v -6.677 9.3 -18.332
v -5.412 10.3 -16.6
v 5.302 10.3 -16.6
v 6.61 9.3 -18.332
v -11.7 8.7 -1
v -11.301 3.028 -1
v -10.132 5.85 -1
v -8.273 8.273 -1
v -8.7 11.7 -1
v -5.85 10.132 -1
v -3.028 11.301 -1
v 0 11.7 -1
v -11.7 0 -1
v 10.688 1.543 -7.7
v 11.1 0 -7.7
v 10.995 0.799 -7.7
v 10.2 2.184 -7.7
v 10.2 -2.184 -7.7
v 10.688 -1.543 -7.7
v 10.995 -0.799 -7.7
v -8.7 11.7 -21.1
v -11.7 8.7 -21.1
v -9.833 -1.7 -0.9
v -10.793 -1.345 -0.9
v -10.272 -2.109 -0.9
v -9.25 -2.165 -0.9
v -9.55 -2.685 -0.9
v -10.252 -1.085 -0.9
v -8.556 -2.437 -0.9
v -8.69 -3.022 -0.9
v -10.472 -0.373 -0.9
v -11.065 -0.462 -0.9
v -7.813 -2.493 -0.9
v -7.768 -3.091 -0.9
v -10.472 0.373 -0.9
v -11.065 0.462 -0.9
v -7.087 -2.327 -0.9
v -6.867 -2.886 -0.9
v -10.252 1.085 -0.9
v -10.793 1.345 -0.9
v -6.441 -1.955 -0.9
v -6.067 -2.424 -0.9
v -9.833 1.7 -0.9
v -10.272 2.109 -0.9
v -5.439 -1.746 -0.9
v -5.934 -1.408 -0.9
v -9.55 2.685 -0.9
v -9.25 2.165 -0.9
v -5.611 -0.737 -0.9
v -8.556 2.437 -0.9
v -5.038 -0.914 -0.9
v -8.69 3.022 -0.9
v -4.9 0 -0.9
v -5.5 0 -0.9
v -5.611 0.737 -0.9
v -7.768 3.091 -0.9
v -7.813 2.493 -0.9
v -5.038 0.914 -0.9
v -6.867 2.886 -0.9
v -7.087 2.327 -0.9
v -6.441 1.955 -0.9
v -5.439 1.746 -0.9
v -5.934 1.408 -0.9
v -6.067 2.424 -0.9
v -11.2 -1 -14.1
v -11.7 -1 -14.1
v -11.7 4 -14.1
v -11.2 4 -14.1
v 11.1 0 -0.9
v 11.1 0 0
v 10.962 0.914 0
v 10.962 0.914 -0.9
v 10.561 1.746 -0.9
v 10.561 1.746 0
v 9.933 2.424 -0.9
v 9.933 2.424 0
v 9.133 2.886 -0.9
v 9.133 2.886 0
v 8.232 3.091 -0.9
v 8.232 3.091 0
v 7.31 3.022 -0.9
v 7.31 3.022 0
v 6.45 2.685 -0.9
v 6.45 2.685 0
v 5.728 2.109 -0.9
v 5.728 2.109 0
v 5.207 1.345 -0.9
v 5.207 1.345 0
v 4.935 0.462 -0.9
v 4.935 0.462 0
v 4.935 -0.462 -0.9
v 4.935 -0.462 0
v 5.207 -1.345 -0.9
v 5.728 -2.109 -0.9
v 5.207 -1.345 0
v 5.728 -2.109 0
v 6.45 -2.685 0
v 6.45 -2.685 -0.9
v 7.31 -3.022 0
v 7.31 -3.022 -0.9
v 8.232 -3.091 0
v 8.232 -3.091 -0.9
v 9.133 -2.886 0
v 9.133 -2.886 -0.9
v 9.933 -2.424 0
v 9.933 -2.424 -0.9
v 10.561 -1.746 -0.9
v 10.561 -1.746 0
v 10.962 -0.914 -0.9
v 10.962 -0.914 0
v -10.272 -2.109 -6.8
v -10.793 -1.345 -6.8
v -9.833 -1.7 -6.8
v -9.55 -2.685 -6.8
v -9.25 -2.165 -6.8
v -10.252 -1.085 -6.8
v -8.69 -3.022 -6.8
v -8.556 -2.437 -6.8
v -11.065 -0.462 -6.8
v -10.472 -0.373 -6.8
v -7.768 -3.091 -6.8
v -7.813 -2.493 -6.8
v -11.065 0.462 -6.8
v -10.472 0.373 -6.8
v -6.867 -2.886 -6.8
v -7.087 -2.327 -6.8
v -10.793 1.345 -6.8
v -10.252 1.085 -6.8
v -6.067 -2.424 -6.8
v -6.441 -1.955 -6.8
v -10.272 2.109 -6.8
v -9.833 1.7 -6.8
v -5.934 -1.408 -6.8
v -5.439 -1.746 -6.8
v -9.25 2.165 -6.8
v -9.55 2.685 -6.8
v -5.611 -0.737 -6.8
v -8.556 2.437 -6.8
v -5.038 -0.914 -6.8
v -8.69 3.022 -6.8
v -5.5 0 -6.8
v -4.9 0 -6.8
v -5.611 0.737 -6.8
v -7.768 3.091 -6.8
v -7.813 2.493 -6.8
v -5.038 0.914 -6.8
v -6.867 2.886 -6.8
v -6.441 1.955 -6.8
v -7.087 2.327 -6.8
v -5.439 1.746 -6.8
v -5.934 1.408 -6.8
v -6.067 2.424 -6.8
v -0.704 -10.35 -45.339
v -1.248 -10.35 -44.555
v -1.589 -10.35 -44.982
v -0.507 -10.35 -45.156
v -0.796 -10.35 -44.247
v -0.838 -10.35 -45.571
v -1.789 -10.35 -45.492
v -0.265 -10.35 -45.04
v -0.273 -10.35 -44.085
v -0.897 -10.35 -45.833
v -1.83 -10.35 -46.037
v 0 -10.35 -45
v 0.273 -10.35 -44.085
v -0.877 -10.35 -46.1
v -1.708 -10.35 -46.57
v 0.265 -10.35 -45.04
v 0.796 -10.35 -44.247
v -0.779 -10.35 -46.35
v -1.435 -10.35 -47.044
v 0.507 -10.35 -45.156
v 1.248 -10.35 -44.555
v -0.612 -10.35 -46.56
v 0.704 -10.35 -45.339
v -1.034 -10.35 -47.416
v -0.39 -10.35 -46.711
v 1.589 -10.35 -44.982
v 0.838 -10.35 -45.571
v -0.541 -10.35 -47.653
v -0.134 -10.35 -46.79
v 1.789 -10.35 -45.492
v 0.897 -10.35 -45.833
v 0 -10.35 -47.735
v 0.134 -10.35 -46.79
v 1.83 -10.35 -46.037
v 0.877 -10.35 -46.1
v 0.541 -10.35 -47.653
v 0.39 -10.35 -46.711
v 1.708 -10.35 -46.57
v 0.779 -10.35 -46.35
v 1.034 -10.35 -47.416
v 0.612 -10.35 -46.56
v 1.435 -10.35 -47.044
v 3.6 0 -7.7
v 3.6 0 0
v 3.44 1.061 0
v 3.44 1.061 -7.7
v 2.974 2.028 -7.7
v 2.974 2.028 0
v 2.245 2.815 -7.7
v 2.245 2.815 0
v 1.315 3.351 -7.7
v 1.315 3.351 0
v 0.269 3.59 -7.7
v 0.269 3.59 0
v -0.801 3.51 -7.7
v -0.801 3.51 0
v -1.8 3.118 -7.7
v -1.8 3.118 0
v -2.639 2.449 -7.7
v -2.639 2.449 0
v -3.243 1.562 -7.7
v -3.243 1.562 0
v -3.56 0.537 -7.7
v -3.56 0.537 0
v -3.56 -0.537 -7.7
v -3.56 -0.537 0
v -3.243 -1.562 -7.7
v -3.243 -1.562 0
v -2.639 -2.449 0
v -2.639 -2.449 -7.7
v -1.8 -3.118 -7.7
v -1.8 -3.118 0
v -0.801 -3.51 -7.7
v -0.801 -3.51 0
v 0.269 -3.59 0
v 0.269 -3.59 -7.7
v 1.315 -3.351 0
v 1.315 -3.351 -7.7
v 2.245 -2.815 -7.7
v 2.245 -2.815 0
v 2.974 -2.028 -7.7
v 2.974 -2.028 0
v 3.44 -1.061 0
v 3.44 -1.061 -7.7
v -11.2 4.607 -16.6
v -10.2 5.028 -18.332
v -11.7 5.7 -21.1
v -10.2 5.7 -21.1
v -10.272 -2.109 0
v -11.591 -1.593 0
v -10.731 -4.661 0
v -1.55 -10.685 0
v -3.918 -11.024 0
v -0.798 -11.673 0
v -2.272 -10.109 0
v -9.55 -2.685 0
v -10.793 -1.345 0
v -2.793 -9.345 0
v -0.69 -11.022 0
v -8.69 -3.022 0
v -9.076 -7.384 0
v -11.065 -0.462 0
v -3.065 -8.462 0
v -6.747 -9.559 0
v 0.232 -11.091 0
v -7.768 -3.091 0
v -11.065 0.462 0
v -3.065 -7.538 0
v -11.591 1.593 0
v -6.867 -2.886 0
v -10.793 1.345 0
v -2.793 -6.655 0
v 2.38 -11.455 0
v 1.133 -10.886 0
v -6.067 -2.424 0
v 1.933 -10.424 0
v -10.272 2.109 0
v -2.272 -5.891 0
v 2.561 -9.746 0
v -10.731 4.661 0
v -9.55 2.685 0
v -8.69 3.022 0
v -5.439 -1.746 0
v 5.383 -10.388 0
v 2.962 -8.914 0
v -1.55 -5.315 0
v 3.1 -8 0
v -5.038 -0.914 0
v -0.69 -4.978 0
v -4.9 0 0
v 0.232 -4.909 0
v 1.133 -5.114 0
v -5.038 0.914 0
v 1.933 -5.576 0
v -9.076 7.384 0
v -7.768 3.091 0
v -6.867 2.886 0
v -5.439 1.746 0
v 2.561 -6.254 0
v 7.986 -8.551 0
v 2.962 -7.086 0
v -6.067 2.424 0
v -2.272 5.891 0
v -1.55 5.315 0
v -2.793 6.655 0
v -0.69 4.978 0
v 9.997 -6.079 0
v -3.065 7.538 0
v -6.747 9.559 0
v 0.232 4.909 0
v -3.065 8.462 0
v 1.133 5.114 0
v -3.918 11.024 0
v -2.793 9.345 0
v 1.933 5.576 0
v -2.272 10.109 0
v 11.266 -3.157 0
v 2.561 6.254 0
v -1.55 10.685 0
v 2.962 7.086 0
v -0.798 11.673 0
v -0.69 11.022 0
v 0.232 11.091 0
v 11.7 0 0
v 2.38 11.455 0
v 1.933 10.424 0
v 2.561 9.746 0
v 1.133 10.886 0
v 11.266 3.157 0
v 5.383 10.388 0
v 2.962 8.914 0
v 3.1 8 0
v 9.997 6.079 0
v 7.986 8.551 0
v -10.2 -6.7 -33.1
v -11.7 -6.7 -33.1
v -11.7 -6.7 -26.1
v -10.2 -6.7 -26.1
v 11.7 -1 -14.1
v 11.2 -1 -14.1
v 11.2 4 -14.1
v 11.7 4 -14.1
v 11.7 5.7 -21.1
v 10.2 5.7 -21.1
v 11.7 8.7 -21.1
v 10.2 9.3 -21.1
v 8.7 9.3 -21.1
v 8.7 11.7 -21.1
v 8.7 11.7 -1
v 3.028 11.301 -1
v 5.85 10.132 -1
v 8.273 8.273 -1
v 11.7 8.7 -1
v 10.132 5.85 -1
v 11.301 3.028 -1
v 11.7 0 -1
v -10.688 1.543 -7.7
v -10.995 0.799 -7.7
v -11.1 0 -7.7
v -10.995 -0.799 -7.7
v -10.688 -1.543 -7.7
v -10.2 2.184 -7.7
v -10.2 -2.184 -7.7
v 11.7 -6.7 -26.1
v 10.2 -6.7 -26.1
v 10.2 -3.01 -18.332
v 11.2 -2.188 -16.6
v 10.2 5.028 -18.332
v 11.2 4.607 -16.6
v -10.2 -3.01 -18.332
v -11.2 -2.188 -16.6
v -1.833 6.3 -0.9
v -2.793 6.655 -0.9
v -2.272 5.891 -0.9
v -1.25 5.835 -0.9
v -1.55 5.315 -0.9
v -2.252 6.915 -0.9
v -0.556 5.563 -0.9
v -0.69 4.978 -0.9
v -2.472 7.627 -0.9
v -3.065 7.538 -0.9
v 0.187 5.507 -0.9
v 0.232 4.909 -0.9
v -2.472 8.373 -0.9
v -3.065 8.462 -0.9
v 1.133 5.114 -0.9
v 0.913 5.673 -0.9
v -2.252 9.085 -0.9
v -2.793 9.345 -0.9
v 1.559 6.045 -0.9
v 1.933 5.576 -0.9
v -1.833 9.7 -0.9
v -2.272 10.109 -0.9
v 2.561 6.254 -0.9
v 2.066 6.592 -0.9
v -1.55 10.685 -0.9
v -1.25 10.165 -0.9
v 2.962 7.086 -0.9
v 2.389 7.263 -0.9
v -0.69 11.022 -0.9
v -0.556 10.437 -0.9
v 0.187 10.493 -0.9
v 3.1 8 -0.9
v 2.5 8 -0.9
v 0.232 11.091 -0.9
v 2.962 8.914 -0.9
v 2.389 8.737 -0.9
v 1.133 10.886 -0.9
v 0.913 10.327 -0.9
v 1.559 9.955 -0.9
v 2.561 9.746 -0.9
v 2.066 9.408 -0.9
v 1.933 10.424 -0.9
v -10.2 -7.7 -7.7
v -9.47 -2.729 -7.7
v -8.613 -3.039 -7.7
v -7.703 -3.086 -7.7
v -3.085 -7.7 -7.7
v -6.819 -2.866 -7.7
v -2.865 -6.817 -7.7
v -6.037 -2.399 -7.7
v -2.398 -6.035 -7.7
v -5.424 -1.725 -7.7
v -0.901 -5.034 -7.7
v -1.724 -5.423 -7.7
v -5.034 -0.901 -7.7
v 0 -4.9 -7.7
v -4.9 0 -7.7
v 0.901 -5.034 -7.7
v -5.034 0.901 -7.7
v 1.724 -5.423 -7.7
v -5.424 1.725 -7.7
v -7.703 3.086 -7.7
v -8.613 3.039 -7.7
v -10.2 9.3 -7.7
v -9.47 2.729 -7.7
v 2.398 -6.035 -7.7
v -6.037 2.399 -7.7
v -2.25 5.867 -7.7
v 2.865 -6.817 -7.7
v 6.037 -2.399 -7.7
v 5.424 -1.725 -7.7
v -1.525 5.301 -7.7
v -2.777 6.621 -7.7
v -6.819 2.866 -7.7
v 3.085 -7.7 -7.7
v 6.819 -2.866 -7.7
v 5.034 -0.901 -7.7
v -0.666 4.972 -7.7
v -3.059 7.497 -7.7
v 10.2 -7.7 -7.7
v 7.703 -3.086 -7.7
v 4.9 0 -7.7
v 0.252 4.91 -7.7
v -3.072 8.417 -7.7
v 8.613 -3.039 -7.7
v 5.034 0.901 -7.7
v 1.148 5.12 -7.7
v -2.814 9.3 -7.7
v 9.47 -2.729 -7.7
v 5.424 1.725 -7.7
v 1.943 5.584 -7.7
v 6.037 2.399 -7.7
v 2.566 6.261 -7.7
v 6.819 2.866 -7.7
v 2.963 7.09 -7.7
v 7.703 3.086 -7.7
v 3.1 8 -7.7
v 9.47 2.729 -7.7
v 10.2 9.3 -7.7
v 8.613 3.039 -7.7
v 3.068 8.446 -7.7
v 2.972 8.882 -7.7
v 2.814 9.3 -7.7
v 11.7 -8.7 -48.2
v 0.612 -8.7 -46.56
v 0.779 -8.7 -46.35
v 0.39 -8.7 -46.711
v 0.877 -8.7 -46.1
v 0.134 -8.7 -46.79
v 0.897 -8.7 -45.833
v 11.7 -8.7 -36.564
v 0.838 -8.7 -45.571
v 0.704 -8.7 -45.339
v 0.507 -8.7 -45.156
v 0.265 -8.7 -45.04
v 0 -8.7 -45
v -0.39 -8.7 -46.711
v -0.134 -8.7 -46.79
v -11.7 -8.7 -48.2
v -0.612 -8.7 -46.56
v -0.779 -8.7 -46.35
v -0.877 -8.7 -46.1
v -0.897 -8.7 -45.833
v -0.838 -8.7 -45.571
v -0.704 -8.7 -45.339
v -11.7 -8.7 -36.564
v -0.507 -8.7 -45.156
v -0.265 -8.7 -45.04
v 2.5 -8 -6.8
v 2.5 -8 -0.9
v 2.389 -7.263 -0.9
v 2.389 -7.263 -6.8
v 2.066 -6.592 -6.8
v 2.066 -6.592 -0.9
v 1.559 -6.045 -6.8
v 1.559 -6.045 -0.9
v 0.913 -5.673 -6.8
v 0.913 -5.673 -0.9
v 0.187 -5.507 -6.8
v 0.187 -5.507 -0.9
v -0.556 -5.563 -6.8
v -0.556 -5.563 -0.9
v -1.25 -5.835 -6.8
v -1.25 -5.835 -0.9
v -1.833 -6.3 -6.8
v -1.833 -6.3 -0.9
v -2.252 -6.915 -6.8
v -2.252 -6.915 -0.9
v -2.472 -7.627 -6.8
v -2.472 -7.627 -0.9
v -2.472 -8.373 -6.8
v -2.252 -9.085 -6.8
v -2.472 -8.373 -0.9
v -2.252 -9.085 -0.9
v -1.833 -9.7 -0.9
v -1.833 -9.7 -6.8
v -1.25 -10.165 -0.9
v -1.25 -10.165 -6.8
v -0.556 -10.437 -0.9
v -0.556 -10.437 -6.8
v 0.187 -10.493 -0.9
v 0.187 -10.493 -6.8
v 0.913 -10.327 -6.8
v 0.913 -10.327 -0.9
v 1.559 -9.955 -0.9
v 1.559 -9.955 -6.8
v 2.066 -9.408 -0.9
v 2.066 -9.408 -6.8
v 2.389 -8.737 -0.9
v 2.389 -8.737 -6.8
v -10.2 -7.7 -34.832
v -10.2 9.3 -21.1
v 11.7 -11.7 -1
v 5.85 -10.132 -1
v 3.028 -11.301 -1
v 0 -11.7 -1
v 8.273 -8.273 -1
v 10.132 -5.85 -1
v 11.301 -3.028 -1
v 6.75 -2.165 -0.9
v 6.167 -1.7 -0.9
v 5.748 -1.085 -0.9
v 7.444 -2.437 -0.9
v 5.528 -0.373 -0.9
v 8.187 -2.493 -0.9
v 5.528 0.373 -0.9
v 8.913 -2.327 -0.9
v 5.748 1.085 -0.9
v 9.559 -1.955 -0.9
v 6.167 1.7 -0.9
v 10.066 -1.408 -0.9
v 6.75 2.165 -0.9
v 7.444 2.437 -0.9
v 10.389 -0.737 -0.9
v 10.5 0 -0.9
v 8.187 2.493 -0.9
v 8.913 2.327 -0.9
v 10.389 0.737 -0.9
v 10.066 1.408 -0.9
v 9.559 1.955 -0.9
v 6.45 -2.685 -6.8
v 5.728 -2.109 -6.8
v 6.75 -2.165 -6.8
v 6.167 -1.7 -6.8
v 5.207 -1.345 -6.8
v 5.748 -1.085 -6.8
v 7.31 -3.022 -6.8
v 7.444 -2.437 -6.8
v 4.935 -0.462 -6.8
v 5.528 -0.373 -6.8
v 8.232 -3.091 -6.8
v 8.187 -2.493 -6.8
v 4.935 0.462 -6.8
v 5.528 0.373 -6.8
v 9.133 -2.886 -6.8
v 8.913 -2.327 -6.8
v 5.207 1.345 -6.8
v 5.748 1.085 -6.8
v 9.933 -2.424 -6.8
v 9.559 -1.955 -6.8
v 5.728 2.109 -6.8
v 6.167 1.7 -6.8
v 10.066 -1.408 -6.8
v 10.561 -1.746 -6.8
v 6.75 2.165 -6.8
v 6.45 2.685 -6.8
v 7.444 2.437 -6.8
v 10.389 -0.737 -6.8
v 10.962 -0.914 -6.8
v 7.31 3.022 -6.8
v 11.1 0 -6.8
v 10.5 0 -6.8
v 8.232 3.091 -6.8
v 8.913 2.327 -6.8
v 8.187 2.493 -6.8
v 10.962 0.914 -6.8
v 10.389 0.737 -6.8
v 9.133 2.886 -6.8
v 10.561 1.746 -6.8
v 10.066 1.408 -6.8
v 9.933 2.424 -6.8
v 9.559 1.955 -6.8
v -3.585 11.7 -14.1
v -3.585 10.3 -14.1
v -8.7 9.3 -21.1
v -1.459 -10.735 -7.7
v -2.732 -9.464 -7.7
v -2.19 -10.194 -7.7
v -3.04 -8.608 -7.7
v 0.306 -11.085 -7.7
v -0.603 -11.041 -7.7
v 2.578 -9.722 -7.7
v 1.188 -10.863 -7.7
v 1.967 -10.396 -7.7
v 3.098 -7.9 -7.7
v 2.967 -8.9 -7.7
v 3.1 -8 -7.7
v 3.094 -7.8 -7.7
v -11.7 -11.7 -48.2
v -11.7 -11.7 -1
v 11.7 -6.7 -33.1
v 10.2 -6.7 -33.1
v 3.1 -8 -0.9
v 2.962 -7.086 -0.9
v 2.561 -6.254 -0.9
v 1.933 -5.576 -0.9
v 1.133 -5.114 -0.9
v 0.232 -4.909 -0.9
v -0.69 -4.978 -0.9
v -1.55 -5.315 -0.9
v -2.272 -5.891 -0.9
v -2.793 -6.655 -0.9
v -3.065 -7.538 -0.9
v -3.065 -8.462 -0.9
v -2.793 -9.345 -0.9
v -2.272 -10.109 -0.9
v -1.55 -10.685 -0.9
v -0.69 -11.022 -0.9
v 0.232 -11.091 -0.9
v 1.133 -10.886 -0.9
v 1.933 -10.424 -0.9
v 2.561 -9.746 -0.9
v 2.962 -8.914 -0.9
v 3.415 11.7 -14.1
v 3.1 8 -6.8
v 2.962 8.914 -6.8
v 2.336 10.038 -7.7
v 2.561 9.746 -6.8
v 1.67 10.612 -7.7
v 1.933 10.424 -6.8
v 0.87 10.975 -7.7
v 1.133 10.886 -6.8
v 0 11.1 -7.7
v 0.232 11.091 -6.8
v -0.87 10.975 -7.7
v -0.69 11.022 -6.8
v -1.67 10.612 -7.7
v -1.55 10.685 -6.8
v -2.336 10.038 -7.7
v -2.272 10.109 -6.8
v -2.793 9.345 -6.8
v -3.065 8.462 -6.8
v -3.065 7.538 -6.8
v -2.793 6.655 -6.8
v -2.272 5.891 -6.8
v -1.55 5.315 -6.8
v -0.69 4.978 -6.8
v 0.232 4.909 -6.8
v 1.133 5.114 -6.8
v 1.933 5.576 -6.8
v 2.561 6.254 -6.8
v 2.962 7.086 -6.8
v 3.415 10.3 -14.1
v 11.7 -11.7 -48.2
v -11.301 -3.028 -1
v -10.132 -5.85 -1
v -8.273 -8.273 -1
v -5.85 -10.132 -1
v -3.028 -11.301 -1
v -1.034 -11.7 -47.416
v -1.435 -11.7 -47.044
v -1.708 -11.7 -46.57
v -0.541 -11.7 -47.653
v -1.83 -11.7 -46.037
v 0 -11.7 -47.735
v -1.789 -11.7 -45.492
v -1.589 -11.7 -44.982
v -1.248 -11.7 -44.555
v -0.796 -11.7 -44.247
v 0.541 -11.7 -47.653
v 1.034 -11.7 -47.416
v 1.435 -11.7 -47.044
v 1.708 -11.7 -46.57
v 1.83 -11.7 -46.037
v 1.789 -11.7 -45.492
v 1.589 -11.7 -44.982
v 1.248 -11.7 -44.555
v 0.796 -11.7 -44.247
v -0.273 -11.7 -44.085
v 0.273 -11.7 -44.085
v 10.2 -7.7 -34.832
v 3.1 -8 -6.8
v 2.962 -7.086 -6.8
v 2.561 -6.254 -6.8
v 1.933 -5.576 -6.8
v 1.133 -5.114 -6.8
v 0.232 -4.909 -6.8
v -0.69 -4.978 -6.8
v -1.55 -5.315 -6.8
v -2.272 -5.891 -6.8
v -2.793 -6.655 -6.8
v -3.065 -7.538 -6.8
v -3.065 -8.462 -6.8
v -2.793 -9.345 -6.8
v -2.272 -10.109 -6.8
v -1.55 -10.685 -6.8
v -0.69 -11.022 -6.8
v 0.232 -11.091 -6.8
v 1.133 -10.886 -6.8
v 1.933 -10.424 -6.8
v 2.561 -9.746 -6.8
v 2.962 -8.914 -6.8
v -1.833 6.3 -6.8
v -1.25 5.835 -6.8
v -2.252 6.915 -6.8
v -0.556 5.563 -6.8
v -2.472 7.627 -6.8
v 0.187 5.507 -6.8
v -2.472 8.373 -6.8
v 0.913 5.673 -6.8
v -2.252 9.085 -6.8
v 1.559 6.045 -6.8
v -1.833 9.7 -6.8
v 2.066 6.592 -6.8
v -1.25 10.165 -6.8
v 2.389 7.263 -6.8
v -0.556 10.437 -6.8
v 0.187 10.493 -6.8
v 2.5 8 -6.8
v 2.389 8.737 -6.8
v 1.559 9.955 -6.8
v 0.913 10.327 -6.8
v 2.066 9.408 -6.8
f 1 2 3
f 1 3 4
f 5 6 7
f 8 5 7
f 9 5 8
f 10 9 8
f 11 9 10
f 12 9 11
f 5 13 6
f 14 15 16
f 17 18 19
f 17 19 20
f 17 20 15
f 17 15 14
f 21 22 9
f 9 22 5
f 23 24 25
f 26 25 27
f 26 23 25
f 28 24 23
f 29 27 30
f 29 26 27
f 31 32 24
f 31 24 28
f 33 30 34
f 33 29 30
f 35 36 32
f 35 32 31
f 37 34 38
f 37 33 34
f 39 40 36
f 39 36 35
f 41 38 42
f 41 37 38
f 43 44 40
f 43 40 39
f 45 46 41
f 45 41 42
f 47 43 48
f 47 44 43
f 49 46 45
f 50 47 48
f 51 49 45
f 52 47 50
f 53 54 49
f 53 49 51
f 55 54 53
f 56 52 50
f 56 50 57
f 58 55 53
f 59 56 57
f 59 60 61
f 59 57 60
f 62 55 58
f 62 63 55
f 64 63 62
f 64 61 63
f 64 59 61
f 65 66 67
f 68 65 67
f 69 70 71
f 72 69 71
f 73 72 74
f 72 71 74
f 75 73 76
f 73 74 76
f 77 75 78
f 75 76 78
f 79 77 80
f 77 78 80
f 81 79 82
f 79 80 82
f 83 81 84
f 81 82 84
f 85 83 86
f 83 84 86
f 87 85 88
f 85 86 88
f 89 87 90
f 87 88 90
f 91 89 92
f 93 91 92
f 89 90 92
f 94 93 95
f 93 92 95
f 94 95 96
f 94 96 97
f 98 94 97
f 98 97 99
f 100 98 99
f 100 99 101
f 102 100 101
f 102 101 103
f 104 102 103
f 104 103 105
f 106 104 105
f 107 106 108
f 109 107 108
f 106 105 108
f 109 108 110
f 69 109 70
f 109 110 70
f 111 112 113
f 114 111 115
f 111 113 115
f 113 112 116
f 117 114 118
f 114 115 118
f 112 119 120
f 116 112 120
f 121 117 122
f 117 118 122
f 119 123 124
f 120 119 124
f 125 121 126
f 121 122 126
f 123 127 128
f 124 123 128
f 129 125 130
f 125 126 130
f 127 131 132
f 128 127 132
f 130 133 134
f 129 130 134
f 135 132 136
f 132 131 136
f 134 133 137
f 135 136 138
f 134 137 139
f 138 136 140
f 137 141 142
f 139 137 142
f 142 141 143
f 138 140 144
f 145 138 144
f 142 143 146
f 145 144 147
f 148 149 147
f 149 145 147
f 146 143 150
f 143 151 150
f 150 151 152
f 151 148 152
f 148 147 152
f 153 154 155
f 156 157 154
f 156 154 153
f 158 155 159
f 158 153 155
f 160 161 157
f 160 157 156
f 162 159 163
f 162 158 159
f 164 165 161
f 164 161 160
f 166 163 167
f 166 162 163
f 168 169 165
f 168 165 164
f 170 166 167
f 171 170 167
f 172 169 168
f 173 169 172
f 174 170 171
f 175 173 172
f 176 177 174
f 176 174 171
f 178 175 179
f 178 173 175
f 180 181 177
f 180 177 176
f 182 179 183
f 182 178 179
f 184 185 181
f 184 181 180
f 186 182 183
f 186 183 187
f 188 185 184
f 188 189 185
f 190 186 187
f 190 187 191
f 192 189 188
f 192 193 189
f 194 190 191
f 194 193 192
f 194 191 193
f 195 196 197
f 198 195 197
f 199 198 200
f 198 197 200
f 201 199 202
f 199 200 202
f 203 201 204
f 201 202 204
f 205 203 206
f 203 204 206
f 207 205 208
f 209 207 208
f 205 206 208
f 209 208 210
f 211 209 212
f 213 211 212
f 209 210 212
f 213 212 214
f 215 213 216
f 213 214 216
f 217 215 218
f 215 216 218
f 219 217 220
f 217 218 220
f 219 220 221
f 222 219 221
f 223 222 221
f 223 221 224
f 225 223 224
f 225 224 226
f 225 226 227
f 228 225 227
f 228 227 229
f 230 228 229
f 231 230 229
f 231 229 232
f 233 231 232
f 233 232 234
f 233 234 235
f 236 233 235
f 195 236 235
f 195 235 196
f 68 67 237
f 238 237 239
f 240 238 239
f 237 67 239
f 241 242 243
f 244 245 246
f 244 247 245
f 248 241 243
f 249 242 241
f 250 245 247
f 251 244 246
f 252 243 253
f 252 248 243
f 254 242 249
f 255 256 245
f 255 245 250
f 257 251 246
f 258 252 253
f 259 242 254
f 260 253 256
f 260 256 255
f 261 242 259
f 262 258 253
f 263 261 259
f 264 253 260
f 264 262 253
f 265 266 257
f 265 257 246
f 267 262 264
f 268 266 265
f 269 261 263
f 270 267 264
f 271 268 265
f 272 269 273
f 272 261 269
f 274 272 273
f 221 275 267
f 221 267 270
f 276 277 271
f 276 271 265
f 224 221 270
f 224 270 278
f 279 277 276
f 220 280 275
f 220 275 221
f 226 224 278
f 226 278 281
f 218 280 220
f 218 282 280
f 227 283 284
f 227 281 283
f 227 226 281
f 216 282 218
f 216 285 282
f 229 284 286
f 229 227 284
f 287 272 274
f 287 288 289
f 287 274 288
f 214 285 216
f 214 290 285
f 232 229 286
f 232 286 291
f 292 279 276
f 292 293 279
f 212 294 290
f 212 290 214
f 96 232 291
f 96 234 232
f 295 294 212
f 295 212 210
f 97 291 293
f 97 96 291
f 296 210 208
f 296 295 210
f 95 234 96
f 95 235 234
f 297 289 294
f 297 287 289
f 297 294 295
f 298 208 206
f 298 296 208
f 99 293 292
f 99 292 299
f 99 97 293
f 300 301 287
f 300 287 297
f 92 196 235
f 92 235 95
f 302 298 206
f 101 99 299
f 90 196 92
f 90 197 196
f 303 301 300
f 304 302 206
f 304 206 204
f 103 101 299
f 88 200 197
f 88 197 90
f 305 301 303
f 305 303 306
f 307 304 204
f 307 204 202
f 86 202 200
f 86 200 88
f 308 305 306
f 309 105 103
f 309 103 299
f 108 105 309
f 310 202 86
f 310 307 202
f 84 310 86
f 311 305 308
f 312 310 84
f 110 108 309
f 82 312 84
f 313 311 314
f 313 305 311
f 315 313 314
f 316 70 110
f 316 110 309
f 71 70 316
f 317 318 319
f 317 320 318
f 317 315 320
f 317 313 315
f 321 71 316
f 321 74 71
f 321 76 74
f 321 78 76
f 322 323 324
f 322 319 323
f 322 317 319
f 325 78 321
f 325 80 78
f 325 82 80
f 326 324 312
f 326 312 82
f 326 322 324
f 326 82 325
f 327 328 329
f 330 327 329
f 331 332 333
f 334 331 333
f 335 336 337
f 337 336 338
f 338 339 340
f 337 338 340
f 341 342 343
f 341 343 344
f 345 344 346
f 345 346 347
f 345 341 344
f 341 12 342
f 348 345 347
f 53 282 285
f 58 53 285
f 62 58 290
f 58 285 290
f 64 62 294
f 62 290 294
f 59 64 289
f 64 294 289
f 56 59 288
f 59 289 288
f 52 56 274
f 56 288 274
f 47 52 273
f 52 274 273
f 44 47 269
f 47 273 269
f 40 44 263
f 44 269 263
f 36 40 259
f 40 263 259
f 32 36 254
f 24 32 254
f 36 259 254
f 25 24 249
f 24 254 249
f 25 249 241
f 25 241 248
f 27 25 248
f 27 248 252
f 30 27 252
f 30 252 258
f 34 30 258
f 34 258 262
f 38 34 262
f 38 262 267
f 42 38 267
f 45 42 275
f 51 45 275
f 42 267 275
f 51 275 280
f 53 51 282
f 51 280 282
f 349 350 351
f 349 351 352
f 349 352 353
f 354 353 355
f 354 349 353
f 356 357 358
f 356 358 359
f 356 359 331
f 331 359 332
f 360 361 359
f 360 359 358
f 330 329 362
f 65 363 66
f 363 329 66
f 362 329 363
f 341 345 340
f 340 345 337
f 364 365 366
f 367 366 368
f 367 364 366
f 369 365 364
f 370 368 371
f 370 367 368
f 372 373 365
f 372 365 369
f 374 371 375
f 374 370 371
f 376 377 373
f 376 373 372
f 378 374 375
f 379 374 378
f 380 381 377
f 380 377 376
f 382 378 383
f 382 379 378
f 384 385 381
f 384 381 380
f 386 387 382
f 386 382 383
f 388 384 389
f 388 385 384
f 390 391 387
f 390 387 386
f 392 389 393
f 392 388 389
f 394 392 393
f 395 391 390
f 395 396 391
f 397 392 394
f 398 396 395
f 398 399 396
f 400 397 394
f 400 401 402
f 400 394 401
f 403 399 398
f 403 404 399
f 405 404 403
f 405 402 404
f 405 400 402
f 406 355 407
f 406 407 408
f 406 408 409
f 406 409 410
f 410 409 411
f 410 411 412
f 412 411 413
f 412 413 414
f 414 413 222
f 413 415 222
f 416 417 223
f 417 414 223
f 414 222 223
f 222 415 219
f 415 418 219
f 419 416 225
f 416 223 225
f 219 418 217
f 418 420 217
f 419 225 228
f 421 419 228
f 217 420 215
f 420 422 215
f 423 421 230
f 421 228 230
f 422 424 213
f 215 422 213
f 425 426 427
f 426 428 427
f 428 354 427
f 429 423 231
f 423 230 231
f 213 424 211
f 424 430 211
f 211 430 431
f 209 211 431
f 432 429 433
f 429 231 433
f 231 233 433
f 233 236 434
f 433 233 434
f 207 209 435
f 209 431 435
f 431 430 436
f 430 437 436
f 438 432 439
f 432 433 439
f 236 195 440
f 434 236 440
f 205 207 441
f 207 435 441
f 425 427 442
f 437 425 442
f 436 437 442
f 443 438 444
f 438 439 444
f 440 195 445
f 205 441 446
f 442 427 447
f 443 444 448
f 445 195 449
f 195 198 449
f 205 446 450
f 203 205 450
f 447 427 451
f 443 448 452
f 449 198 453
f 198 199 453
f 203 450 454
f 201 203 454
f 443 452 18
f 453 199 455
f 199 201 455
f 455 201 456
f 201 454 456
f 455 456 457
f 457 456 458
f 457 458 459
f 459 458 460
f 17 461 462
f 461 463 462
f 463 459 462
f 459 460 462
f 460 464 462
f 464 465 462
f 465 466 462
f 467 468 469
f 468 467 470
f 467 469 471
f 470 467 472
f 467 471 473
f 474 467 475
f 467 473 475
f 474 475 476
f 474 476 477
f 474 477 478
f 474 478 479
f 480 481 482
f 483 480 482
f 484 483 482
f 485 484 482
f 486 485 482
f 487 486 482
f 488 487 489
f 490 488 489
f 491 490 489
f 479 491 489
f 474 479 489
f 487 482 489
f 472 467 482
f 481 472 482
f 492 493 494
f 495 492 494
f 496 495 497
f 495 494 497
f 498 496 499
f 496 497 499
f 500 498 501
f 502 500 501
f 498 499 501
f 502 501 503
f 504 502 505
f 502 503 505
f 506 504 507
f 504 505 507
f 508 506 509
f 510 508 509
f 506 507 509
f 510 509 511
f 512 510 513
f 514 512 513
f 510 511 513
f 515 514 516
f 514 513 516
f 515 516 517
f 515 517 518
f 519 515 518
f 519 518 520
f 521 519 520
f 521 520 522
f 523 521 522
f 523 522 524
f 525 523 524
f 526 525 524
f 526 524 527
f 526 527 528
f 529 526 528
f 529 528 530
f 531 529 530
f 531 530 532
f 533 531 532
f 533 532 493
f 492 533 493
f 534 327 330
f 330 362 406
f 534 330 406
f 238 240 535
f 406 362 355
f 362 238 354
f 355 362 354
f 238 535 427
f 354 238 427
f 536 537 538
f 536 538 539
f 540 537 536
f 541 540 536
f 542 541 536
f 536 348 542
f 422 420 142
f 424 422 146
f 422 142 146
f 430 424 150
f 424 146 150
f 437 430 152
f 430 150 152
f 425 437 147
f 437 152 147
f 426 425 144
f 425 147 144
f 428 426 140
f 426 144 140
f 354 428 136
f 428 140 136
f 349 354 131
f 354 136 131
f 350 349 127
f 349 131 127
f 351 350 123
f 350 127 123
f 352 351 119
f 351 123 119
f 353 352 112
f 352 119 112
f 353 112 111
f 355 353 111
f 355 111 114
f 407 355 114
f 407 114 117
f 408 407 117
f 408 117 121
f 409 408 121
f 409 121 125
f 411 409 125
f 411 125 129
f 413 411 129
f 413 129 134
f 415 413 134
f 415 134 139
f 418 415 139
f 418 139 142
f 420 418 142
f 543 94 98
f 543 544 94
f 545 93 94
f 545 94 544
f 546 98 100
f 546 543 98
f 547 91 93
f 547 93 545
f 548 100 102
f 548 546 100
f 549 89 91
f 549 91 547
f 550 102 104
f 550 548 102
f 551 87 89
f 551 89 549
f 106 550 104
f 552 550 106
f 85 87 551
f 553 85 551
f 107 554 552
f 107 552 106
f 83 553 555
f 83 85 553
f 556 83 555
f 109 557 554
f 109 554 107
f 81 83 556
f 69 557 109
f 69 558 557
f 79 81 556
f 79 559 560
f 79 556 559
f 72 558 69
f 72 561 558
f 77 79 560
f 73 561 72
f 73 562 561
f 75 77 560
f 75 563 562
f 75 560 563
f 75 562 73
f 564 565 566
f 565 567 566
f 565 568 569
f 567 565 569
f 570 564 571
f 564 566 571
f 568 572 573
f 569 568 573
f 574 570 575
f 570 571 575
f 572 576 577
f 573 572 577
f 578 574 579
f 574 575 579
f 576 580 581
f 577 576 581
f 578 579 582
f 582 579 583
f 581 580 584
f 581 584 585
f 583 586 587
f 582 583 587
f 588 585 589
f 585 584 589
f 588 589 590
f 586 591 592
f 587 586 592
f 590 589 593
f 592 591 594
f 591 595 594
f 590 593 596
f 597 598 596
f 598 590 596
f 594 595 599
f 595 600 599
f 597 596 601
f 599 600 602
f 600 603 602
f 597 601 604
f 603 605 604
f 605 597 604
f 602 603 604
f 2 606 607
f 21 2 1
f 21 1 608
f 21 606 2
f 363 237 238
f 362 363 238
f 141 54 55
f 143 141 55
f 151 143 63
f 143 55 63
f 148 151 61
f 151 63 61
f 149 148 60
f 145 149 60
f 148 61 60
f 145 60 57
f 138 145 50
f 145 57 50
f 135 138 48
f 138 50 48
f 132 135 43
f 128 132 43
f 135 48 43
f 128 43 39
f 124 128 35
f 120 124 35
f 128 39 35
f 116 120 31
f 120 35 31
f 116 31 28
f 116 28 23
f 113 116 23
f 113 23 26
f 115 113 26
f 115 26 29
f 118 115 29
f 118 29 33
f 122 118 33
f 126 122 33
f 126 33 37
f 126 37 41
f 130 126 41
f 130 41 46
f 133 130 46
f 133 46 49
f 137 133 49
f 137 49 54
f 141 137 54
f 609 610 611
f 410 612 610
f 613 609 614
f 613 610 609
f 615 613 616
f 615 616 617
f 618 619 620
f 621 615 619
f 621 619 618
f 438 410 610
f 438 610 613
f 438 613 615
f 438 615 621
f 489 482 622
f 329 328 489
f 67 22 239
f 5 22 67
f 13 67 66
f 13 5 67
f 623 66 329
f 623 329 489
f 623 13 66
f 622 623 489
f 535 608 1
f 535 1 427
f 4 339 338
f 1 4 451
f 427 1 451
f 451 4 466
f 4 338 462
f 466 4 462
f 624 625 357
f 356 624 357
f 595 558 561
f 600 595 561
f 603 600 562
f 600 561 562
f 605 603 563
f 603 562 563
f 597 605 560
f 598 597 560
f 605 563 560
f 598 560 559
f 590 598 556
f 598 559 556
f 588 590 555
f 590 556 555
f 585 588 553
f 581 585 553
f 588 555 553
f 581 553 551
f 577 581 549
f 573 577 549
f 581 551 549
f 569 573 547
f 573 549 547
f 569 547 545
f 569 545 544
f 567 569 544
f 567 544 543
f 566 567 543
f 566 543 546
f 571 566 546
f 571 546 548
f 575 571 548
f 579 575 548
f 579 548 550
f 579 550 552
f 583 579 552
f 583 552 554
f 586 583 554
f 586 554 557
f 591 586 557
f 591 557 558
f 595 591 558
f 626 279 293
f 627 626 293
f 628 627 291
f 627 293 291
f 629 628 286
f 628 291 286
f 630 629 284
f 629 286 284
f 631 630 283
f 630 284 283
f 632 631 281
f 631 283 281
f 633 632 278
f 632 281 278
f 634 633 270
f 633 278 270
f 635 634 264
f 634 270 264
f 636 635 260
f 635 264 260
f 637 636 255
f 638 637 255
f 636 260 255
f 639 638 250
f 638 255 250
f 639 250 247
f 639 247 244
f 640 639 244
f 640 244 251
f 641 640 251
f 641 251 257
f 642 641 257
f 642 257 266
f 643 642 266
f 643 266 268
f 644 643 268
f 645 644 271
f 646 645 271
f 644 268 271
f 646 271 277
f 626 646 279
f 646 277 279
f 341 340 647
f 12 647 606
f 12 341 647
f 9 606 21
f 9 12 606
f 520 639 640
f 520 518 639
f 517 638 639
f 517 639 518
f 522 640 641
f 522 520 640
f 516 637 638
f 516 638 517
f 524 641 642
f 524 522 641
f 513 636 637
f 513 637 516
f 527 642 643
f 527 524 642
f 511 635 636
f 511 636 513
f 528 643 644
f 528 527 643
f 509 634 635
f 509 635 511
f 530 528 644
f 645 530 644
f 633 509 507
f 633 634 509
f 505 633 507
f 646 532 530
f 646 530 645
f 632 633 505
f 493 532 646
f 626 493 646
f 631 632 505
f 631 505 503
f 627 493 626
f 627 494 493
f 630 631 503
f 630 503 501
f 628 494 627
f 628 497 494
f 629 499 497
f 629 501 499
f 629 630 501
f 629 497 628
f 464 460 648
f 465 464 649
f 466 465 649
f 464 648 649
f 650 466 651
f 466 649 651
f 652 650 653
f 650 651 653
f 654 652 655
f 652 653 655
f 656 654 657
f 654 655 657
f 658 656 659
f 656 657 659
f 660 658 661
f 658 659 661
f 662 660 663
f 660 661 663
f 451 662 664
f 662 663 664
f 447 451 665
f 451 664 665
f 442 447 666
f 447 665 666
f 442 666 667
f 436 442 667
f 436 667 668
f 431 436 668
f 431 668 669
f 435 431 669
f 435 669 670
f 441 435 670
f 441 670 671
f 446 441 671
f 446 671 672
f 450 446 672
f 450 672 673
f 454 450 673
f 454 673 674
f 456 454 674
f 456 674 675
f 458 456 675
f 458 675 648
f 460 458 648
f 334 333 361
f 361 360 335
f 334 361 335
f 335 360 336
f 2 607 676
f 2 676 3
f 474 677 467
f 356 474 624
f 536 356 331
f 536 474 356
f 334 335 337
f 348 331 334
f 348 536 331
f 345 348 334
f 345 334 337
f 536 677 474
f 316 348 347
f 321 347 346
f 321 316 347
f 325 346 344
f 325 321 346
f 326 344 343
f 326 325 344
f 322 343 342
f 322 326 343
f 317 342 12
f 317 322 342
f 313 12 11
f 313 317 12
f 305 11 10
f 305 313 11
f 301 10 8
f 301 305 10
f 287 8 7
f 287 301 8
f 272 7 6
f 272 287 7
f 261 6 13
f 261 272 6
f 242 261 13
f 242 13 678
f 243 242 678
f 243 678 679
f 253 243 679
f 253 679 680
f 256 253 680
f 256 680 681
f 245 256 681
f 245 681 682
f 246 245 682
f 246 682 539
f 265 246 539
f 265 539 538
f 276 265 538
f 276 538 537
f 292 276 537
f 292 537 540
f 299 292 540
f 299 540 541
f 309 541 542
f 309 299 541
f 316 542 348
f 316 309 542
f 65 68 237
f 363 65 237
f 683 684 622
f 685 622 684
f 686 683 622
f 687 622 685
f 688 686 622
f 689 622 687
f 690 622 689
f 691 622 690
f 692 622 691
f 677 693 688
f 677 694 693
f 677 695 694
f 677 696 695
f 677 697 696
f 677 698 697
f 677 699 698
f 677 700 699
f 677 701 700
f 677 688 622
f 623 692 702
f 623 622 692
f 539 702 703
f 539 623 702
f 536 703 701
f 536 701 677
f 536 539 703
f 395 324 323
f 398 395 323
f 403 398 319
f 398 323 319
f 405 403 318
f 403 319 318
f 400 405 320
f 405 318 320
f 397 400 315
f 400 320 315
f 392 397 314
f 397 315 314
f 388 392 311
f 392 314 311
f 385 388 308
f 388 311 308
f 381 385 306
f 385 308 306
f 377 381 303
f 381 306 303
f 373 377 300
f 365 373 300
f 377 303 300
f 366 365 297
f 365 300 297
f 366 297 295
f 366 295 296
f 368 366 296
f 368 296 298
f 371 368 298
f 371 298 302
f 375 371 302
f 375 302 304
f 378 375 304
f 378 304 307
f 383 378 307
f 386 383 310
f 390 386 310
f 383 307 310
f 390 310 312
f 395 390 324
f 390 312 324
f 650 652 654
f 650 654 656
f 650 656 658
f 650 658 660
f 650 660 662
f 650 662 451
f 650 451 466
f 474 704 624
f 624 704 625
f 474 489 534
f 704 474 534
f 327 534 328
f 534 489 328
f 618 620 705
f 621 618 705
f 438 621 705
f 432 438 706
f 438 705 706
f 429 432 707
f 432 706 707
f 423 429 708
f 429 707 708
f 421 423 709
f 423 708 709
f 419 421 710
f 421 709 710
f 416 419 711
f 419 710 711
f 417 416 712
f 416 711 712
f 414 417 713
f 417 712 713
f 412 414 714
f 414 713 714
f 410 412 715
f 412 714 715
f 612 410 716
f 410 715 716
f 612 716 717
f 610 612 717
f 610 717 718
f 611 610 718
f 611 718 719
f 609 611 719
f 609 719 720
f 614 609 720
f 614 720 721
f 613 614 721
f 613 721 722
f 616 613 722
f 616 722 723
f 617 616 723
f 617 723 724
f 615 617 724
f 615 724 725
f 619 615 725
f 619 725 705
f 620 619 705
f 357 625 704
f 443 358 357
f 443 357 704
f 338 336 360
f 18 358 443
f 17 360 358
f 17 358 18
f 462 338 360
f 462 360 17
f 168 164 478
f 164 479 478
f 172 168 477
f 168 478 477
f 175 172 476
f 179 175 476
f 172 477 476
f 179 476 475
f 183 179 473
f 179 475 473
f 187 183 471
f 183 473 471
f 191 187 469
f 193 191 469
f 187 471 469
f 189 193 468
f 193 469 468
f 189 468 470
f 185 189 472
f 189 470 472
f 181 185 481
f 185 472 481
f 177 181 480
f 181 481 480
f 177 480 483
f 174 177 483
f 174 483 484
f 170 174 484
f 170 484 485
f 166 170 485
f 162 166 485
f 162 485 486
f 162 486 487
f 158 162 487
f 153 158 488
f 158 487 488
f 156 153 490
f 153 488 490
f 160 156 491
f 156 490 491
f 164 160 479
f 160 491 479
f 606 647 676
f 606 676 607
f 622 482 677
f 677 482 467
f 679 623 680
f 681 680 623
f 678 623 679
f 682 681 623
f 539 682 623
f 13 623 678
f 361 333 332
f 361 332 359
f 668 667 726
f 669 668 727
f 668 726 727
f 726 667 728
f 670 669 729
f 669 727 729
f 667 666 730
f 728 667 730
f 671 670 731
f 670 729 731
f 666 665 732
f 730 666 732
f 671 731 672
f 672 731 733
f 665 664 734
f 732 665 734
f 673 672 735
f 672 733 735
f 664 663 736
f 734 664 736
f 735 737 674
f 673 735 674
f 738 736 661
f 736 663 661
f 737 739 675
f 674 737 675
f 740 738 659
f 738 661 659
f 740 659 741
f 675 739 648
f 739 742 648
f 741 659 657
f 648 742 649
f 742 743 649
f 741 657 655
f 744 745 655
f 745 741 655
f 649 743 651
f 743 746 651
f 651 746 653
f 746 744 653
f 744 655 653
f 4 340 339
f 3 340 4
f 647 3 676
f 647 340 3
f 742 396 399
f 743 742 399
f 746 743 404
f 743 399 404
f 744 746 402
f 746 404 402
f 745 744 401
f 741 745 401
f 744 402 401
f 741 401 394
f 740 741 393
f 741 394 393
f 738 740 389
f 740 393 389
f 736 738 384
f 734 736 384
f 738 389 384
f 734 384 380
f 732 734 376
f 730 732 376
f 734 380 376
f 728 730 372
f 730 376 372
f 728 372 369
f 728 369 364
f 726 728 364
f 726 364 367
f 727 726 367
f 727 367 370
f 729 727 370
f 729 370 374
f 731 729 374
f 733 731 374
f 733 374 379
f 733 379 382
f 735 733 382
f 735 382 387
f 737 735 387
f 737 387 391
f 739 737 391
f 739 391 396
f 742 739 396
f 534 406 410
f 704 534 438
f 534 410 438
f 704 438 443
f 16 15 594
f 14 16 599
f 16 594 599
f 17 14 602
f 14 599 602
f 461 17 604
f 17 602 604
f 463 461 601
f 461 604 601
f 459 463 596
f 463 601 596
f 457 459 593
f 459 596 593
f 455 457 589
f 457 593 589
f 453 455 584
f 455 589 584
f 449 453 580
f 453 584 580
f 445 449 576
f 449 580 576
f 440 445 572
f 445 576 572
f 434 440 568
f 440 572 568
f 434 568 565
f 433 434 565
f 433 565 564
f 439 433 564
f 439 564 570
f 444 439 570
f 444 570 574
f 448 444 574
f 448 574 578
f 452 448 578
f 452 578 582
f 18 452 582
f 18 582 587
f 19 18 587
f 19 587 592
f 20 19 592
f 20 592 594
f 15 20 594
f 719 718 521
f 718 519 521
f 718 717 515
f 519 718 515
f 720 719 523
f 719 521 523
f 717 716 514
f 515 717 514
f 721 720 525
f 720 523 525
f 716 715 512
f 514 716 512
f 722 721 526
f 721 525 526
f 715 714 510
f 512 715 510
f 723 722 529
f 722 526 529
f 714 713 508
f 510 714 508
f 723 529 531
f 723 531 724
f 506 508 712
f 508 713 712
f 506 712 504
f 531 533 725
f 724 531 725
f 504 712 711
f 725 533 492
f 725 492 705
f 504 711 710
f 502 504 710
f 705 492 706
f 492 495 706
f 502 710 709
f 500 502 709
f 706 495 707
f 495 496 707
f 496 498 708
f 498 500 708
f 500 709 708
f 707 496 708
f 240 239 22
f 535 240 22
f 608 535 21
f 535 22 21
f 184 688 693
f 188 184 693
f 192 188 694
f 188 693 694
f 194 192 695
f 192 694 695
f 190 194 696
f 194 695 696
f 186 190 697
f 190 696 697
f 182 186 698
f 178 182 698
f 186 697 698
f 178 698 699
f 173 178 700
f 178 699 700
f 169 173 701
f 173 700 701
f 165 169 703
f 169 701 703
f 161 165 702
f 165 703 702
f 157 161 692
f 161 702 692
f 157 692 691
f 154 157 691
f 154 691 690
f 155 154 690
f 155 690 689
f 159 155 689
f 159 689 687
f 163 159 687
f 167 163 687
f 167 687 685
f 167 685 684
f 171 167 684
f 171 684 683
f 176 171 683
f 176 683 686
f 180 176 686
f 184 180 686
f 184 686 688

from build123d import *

# Parameters (mm, degrees)
SKETCH_1_R                  = 11.7
EXTRUDE_1_DEPTH             = 7.7
SKETCH_1_3_R                = 2.5
CUT_EXTRUDE_1_DEPTH         = 19.250205478
SKETCH_1_5_R                = 3.1
SKETCH_1_5_R_2              = 2.5
CUT_EXTRUDE_2_DEPTH         = 0.9
CUT_EXTRUDE_START           = -6.8
SKETCH_1_6_R                = 3.1
SKETCH_1_6_R_2              = 2.5
CUT_EXTRUDE_3_DEPTH         = 0.9
EXTRUDE_START               = -7.7
SKETCH_2_W                  = 23.4
SKETCH_2_H                  = 2.4
SKETCH_2_H_2                = 4
EXTRUDE_3_DEPTH             = 40.5
SKETCH_3_W                  = 1.5
SKETCH_3_H                  = 23.4
EXTRUDE_4_DEPTH             = 40.3
EXTRUDE_START_2             = -1
EXTRUDE_5_DEPTH             = 6.7
CUT_EXTRUDE_5_DEPTH         = 55.842410596
CHAMFER_1_SIZE              = 3
CUT_EXTRUDE_6_REACH         = 56.842
EXTRUDE_6_REACH             = 52.961
EXTRUDE_6_DIRECTION_2_REACH = 52.961
EXTRUDE_7_REACH             = 52.961
EXTRUDE_7_DIRECTION_2_REACH = 52.961
HOLE_WIZARD_1_D             = 1.8
HOLE_WIZARD_1_CBORE_D       = 3.67
HOLE_WIZARD_1_CBORE_DEPTH   = 1.35
CUT_EXTRUDE_7_REACH         = 52.961
SKETCH_19_R                 = 3.6


with BuildPart() as part:
    # 草图1 → 凸台-拉伸1 (new body)
    with BuildSketch(Plane.XY):
        Circle(SKETCH_1_R)
    extrude(amount=-EXTRUDE_1_DEPTH)

    # 草图1<3> → 切除-拉伸1 (cut, through all)
    with BuildSketch(Plane.XY):
        with Locations((-8, 0)):
            Circle(SKETCH_1_3_R)
        with Locations((0, 8)):
            Circle(SKETCH_1_3_R)
        with Locations((8, 0)):
            Circle(SKETCH_1_3_R)
        with Locations((0, -8)):
            Circle(SKETCH_1_3_R)
    extrude(amount=-CUT_EXTRUDE_1_DEPTH, mode=Mode.SUBTRACT)

    # 草图1<5> → 切除-拉伸2 (cut)
    # profile 1 of 4: a face of its own
    with BuildSketch(Plane.XY):
        with Locations((-8, 0)):
            Circle(SKETCH_1_5_R)
        with Locations((-8, 0)):
            Circle(SKETCH_1_5_R_2, mode=Mode.SUBTRACT)
    # profile 2 of 4: a face of its own
    with BuildSketch(Plane.XY):
        with Locations((0, 8)):
            Circle(SKETCH_1_5_R)
        with Locations((0, 8)):
            Circle(SKETCH_1_5_R_2, mode=Mode.SUBTRACT)
    # profile 3 of 4: a face of its own
    with BuildSketch(Plane.XY):
        with Locations((8, 0)):
            Circle(SKETCH_1_5_R)
        with Locations((8, 0)):
            Circle(SKETCH_1_5_R_2, mode=Mode.SUBTRACT)
    # profile 4 of 4: a face of its own
    with BuildSketch(Plane.XY):
        with Locations((0, -8)):
            Circle(SKETCH_1_5_R)
        with Locations((0, -8)):
            Circle(SKETCH_1_5_R_2, mode=Mode.SUBTRACT)
    extrude(amount=-CUT_EXTRUDE_2_DEPTH, mode=Mode.SUBTRACT)

    # 草图1<6> → 切除-拉伸3 (cut)
    # profile 1 of 4: a face of its own
    with BuildSketch(Plane.XY.offset(CUT_EXTRUDE_START)):
        with Locations((-8, 0)):
            Circle(SKETCH_1_6_R)
        with Locations((-8, 0)):
            Circle(SKETCH_1_6_R_2, mode=Mode.SUBTRACT)
    # profile 2 of 4: a face of its own
    with BuildSketch(Plane.XY.offset(CUT_EXTRUDE_START)):
        with Locations((8, 0)):
            Circle(SKETCH_1_6_R)
        with Locations((8, 0)):
            Circle(SKETCH_1_6_R_2, mode=Mode.SUBTRACT)
    # profile 3 of 4: a face of its own
    with BuildSketch(Plane.XY.offset(CUT_EXTRUDE_START)):
        with Locations((0, -8)):
            Circle(SKETCH_1_6_R)
        with Locations((0, -8)):
            Circle(SKETCH_1_6_R_2, mode=Mode.SUBTRACT)
    # profile 4 of 4: a face of its own
    with BuildSketch(Plane.XY.offset(CUT_EXTRUDE_START)):
        with Locations((0, 8)):
            Circle(SKETCH_1_6_R)
        with Locations((0, 8)):
            Circle(SKETCH_1_6_R_2, mode=Mode.SUBTRACT)
    extrude(amount=-CUT_EXTRUDE_3_DEPTH, mode=Mode.SUBTRACT)

    # 草图2 → 凸台-拉伸3 (add)
    with BuildSketch(Plane.XY.offset(EXTRUDE_START)):
        with Locations((0, 10.5)):
            Rectangle(SKETCH_2_W, SKETCH_2_H)
        with Locations((0, -9.7)):
            Rectangle(SKETCH_2_W, SKETCH_2_H_2)
    extrude(amount=-EXTRUDE_3_DEPTH)

    # 草图3 → 凸台-拉伸4 (add)
    with BuildSketch(Plane.XY.offset(EXTRUDE_START)):
        with Locations((-10.95, 0)):
            Rectangle(SKETCH_3_W, SKETCH_3_H)
        with Locations((10.95, 0)):
            Rectangle(SKETCH_3_W, SKETCH_3_H)
    extrude(amount=-EXTRUDE_4_DEPTH)

    # 草图4 → 凸台-拉伸5 (add)
    with BuildSketch(Plane.XY.offset(EXTRUDE_START_2)):
        with BuildLine():
            Line((3.2e-08, 11.7), (-11.7, 11.7))
            Line((-11.7, 11.7), (-11.7, 0))
            ThreePointArc((-11.7, 0), (-8.273149328, 8.273149351), (3.2e-08, 11.7))
        make_face()
        with BuildLine():
            Line((11.7, 11.7), (3.2e-08, 11.7))
            ThreePointArc((3.2e-08, 11.7), (8.273149351, 8.273149328), (11.7, 0))
            Line((11.7, 0), (11.7, 11.7))
        make_face()
        with BuildLine():
            ThreePointArc((3e-09, -11.7), (-8.273149339, -8.273149341), (-11.7, 0))
            Line((-11.7, 0), (-11.7, -11.7))
            Line((-11.7, -11.7), (3e-09, -11.7))
        make_face()
        with BuildLine():
            Line((11.7, -11.7), (11.7, 0))
            ThreePointArc((11.7, 0), (8.273149341, -8.273149339), (3e-09, -11.7))
            Line((3e-09, -11.7), (11.7, -11.7))
        make_face()
    extrude(amount=-EXTRUDE_5_DEPTH)

    # 草图7 → 切除-拉伸5 (cut, through all)
    with BuildSketch(Plane.ZY.offset(11.7)):
        Polygon((-48.2, 11.7), (-48.2, -8.7), (-36.564101615, -8.7), (-33.1, -6.7), (-26.1, -6.7), (-14.1, -1), (-14.1, 4), (-21.1, 5.7), (-21.1, 11.7), align=None)
    extrude(amount=-CUT_EXTRUDE_5_DEPTH, mode=Mode.SUBTRACT)

    # 倒角1
    chamfer_1_edges = [part.edges().sort_by_distance(p)[0] for p in [
        (-11.7, 11.7, -11.05),
        (11.7, 11.7, -11.05),
    ]]
    chamfer(chamfer_1_edges, length=CHAMFER_1_SIZE)

    # 草图8 → 切除-拉伸6 (cut, up to next)
    with BuildSketch(Plane(origin=(0, 11.7, 0), x_dir=(1, 0, 0), z_dir=(0, 1, 0)), mode=Mode.PRIVATE) as cut_extrude_6_sk1:
        Polygon((8.7, 21.1), (3.414837489, 14.1), (-3.585162511, 14.1), (-8.7, 21.1), align=None)
    cut_extrude_6_tool1 = extrude(cut_extrude_6_sk1.sketch, amount=-CUT_EXTRUDE_6_REACH, mode=Mode.PRIVATE) & part.part
    add(cut_extrude_6_tool1.solids().sort_by_distance((-0.036531, 11.7, -18.097268))[0], mode=Mode.SUBTRACT)

    # 草图12 → 凸台-拉伸6 (add, up to next)
    with BuildSketch(Plane(origin=(0, 0, 0), x_dir=(0, 0, -1), z_dir=(1, 0, 0)), mode=Mode.PRIVATE) as extrude_6_sk1:
        Polygon((14.1, 10.3), (16.6, 10.3), (18.332050808, 9.3), (14.1, 9.3), align=None)
    extrude_6_tool1 = extrude(extrude_6_sk1.sketch, amount=EXTRUDE_6_REACH, mode=Mode.PRIVATE) - part.part
    add(extrude_6_tool1.solids().sort_by_distance((0, 9.757119, -15.820148))[0])

    # 草图12 → 凸台-拉伸6 direction 2 (add, up to next)
    with BuildSketch(Plane(origin=(0, 0, 0), x_dir=(0, 0, -1), z_dir=(1, 0, 0)), mode=Mode.PRIVATE) as extrude_6_direction_2_sk1:
        Polygon((14.1, 10.3), (16.6, 10.3), (18.332050808, 9.3), (14.1, 9.3), align=None)
    extrude_6_direction_2_tool1 = extrude(extrude_6_direction_2_sk1.sketch, amount=-EXTRUDE_6_DIRECTION_2_REACH, mode=Mode.PRIVATE) - part.part
    add(extrude_6_direction_2_tool1.solids().sort_by_distance((0, 9.757119, -15.820148))[0])

    # 草图13 → 凸台-拉伸7 (add, up to next)
    with BuildSketch(Plane(origin=(0, 0, 0), x_dir=(1, 0, 0), z_dir=(0, 1, 0)), mode=Mode.PRIVATE) as extrude_7_sk1:
        Polygon((10.2, 14.1), (11.2, 14.1), (11.2, 16.6), (10.2, 18.332050808), align=None)
    extrude_7_tool1 = extrude(extrude_7_sk1.sketch, amount=EXTRUDE_7_REACH, mode=Mode.PRIVATE) - part.part
    # 草图13 → 凸台-拉伸7 (add, up to next)
    with BuildSketch(Plane(origin=(0, 0, 0), x_dir=(1, 0, 0), z_dir=(0, 1, 0)), mode=Mode.PRIVATE) as extrude_7_sk2:
        Polygon((-10.2, 14.1), (-11.2, 14.1), (-11.2, 16.6), (-10.2, 18.332050808), align=None)
    extrude_7_tool2 = extrude(extrude_7_sk2.sketch, amount=EXTRUDE_7_REACH, mode=Mode.PRIVATE) - part.part
    add(extrude_7_tool1.solids().sort_by_distance((10.657119, 0, -15.820148))[0])
    add(extrude_7_tool2.solids().sort_by_distance((-10.657119, 0, -15.820148))[0])

    # 草图13 → 凸台-拉伸7 direction 2 (add, up to next)
    with BuildSketch(Plane(origin=(0, 0, 0), x_dir=(1, 0, 0), z_dir=(0, 1, 0)), mode=Mode.PRIVATE) as extrude_7_direction_2_sk1:
        Polygon((10.2, 14.1), (11.2, 14.1), (11.2, 16.6), (10.2, 18.332050808), align=None)
    extrude_7_direction_2_tool1 = extrude(extrude_7_direction_2_sk1.sketch, amount=-EXTRUDE_7_DIRECTION_2_REACH, mode=Mode.PRIVATE) - part.part
    # 草图13 → 凸台-拉伸7 direction 2 (add, up to next)
    with BuildSketch(Plane(origin=(0, 0, 0), x_dir=(1, 0, 0), z_dir=(0, 1, 0)), mode=Mode.PRIVATE) as extrude_7_direction_2_sk2:
        Polygon((-10.2, 14.1), (-11.2, 14.1), (-11.2, 16.6), (-10.2, 18.332050808), align=None)
    extrude_7_direction_2_tool2 = extrude(extrude_7_direction_2_sk2.sketch, amount=-EXTRUDE_7_DIRECTION_2_REACH, mode=Mode.PRIVATE) - part.part
    add(extrude_7_direction_2_tool1.solids().sort_by_distance((10.657119, 0, -15.820148))[0])
    add(extrude_7_direction_2_tool2.solids().sort_by_distance((-10.657119, 0, -15.820148))[0])

    # 孔1 (through all)
    with Locations(Plane(origin=(0, -11.7, -45.9), x_dir=(0, 0, -1), z_dir=(0, -1, 0))):
        with Locations((0, 0)):
            CounterBoreHole(HOLE_WIZARD_1_D / 2, HOLE_WIZARD_1_CBORE_D / 2, HOLE_WIZARD_1_CBORE_DEPTH)

    # 草图19 → 切除-拉伸7 (cut, up to next)
    with BuildSketch(Plane.XY, mode=Mode.PRIVATE) as cut_extrude_7_sk1:
        Circle(SKETCH_19_R)
    cut_extrude_7_tool1 = extrude(cut_extrude_7_sk1.sketch, amount=-CUT_EXTRUDE_7_REACH, mode=Mode.PRIVATE) & part.part
    add(cut_extrude_7_tool1.solids().sort_by_distance((0, 0, 0))[0], mode=Mode.SUBTRACT)


solid = part.part
